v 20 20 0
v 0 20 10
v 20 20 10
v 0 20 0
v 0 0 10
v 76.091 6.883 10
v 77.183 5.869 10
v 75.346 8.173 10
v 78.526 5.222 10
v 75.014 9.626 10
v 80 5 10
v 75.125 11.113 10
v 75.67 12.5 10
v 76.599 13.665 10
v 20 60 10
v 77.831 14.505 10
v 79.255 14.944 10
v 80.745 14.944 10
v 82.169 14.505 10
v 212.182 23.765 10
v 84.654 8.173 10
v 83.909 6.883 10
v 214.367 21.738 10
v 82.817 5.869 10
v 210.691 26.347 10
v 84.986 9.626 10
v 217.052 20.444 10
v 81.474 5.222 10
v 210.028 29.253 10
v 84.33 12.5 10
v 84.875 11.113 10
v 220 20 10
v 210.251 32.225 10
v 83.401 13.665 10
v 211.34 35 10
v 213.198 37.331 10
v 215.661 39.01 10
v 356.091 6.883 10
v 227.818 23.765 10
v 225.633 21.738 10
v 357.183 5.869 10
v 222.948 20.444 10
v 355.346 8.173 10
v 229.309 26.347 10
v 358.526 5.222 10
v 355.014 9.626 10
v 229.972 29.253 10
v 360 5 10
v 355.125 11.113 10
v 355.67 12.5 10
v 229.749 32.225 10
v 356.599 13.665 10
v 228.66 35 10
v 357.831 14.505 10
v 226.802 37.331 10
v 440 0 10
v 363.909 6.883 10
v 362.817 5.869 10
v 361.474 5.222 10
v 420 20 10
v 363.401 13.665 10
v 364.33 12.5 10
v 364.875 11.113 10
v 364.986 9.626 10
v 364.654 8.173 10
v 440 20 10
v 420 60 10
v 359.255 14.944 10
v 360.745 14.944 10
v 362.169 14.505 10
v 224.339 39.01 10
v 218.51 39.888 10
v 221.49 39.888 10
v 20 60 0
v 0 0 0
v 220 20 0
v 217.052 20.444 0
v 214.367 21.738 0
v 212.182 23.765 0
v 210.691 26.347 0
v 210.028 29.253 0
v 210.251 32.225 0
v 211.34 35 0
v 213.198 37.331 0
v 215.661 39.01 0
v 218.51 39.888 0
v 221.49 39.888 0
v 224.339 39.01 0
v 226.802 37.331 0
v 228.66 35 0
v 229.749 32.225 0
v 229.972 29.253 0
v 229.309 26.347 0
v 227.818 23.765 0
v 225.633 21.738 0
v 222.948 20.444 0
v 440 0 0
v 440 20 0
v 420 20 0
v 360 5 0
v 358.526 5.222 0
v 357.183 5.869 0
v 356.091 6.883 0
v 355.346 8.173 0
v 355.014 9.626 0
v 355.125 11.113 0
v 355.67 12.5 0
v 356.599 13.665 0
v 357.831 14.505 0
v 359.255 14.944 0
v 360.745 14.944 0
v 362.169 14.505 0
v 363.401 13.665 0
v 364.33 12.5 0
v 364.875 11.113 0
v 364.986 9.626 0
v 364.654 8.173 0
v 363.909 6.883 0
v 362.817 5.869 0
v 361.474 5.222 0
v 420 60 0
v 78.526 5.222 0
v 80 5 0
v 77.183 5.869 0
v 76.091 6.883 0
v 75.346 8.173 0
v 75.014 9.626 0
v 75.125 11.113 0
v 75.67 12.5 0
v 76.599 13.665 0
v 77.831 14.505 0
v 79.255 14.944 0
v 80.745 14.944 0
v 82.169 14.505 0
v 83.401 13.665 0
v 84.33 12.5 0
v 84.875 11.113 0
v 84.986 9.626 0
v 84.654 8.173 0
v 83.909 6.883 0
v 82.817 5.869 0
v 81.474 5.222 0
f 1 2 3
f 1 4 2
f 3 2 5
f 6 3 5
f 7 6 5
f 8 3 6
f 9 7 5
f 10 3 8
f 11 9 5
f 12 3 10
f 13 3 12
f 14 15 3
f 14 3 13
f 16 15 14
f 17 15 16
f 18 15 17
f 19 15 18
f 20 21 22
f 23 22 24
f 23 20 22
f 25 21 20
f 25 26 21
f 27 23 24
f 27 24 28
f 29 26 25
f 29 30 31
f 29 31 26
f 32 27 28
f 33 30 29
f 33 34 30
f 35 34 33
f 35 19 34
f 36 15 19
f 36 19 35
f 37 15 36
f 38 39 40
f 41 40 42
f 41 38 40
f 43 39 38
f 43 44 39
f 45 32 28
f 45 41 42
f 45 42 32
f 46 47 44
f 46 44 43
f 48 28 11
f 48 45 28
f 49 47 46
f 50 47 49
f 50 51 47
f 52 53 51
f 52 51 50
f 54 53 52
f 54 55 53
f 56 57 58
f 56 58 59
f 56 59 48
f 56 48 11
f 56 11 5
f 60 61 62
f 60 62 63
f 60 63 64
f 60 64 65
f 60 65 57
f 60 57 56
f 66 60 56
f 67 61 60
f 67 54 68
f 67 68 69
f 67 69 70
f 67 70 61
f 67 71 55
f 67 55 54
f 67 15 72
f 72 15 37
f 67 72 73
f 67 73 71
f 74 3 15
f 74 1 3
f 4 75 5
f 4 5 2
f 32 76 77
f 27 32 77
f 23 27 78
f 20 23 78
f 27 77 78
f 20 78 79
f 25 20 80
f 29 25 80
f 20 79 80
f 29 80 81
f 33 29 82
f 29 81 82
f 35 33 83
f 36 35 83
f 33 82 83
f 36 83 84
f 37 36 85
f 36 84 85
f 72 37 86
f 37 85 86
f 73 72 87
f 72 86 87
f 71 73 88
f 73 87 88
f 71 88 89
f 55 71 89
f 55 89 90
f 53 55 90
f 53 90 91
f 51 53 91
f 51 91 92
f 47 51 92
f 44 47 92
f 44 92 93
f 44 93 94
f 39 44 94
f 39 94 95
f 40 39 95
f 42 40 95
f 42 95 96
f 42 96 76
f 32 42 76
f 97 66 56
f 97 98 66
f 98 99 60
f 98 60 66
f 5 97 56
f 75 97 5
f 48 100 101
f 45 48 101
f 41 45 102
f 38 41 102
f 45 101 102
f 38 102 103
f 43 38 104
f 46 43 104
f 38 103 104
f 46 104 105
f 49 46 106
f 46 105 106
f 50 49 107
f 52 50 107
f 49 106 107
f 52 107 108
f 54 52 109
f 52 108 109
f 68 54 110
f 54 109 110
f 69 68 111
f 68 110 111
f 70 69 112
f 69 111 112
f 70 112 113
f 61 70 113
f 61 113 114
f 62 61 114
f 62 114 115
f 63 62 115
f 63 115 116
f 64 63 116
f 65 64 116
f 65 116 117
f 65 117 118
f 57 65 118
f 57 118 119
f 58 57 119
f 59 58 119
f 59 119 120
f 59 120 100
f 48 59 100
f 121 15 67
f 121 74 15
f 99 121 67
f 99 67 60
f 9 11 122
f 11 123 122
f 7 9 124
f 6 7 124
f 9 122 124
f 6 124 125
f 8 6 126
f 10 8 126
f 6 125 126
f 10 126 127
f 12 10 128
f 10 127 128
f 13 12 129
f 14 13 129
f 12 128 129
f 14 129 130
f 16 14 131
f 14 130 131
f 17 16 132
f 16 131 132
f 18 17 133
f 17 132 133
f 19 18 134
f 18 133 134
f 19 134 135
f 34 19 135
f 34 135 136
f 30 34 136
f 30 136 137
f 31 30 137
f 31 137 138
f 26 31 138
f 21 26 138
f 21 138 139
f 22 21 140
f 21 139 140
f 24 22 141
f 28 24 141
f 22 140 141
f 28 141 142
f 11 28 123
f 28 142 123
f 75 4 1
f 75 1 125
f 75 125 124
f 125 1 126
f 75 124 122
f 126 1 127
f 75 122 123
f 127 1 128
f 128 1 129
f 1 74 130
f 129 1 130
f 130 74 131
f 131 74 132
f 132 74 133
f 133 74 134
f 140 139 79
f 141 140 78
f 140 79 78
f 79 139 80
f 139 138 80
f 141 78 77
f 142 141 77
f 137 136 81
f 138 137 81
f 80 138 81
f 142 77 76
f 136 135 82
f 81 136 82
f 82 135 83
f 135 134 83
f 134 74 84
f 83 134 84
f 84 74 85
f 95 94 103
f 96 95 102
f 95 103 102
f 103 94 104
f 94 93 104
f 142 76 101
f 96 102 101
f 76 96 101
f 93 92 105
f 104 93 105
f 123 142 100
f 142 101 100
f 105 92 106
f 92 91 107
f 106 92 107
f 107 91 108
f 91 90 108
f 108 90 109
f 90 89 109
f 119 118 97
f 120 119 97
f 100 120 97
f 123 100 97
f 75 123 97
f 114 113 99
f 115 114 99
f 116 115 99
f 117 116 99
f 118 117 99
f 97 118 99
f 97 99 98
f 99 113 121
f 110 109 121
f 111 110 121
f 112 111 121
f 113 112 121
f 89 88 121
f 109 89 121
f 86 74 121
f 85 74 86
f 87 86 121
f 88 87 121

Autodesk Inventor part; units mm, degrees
ref_plane "YZ Plane" through (0, 0, 0) normal (1, 0, 0) x (0, 1, 0)
ref_plane "XZ Plane" through (0, 0, 0) normal (0, 1, 0) x (-1, 0, 0)
ref_plane "XY Plane" through (0, 0, 0) normal (0, 0, 1) x (1, 0, 0)
sketch "Sketch1" plane through (0, 0, 0) normal (0, 0, 1) x (1, 0, 0)
  line L0 (0, 0) -> (0, 20)
  line L1 (0, 20) -> (20, 20)
  line L2 (20, 20) -> (20, 60)
  line L3 (20, 60) -> (420, 60)
  line L4 (420, 60) -> (420, 20)
  line L5 (420, 20) -> (440, 20)
  line L6 (440, 20) -> (440, 0)
  line L7 (440, 0) -> (0, 0)
  dimension "d0" = 20
  dimension "d1" = 20
  dimension "d2" = 40
  dimension "d3" = 400
  dimension "d4" = 40
  dimension "d5" = 20
extrude "Extrusion1" add sketch "Sketch1" along normal blind 10
sketch "Sketch2" plane through (0, 0, 10) normal (0, 0, 1) x (1, 0, 0)
  line L0 (20, 60) -> (20, 20) projected
  line L1 (0, 0) -> (440, 0) projected
  point P0 (80, 10)
  dimension "d8" = 60
  dimension "d16" = 10
hole "Hole1" at (80, 10, 10) direction (0, 0, -1) diameter 10 end through all
sketch "Sketch3" plane through (0, 0, 10) normal (0, 0, 1) x (1, 0, 0)
  line L0 (420, 20) -> (420, 60) projected
  line L1 (0, 0) -> (440, 0) projected
  point P0 (360, 10)
  dimension "d17" = 60
  dimension "d25" = 10
hole "Hole2" at (360, 10, 10) direction (0, 0, -1) diameter 10 end through all
sketch "Sketch4" plane through (0, 0, 10) normal (0, 0, 1) x (1, 0, 0)
  line L0 (20, 60) -> (20, 20) projected
  line L1 (0, 0) -> (440, 0) projected
  point P0 (220, 30)
  dimension "d26" = 200
  dimension "d34" = 30
hole "Hole3" at (220, 30, 10) direction (0, 0, -1) diameter 20 end through all
